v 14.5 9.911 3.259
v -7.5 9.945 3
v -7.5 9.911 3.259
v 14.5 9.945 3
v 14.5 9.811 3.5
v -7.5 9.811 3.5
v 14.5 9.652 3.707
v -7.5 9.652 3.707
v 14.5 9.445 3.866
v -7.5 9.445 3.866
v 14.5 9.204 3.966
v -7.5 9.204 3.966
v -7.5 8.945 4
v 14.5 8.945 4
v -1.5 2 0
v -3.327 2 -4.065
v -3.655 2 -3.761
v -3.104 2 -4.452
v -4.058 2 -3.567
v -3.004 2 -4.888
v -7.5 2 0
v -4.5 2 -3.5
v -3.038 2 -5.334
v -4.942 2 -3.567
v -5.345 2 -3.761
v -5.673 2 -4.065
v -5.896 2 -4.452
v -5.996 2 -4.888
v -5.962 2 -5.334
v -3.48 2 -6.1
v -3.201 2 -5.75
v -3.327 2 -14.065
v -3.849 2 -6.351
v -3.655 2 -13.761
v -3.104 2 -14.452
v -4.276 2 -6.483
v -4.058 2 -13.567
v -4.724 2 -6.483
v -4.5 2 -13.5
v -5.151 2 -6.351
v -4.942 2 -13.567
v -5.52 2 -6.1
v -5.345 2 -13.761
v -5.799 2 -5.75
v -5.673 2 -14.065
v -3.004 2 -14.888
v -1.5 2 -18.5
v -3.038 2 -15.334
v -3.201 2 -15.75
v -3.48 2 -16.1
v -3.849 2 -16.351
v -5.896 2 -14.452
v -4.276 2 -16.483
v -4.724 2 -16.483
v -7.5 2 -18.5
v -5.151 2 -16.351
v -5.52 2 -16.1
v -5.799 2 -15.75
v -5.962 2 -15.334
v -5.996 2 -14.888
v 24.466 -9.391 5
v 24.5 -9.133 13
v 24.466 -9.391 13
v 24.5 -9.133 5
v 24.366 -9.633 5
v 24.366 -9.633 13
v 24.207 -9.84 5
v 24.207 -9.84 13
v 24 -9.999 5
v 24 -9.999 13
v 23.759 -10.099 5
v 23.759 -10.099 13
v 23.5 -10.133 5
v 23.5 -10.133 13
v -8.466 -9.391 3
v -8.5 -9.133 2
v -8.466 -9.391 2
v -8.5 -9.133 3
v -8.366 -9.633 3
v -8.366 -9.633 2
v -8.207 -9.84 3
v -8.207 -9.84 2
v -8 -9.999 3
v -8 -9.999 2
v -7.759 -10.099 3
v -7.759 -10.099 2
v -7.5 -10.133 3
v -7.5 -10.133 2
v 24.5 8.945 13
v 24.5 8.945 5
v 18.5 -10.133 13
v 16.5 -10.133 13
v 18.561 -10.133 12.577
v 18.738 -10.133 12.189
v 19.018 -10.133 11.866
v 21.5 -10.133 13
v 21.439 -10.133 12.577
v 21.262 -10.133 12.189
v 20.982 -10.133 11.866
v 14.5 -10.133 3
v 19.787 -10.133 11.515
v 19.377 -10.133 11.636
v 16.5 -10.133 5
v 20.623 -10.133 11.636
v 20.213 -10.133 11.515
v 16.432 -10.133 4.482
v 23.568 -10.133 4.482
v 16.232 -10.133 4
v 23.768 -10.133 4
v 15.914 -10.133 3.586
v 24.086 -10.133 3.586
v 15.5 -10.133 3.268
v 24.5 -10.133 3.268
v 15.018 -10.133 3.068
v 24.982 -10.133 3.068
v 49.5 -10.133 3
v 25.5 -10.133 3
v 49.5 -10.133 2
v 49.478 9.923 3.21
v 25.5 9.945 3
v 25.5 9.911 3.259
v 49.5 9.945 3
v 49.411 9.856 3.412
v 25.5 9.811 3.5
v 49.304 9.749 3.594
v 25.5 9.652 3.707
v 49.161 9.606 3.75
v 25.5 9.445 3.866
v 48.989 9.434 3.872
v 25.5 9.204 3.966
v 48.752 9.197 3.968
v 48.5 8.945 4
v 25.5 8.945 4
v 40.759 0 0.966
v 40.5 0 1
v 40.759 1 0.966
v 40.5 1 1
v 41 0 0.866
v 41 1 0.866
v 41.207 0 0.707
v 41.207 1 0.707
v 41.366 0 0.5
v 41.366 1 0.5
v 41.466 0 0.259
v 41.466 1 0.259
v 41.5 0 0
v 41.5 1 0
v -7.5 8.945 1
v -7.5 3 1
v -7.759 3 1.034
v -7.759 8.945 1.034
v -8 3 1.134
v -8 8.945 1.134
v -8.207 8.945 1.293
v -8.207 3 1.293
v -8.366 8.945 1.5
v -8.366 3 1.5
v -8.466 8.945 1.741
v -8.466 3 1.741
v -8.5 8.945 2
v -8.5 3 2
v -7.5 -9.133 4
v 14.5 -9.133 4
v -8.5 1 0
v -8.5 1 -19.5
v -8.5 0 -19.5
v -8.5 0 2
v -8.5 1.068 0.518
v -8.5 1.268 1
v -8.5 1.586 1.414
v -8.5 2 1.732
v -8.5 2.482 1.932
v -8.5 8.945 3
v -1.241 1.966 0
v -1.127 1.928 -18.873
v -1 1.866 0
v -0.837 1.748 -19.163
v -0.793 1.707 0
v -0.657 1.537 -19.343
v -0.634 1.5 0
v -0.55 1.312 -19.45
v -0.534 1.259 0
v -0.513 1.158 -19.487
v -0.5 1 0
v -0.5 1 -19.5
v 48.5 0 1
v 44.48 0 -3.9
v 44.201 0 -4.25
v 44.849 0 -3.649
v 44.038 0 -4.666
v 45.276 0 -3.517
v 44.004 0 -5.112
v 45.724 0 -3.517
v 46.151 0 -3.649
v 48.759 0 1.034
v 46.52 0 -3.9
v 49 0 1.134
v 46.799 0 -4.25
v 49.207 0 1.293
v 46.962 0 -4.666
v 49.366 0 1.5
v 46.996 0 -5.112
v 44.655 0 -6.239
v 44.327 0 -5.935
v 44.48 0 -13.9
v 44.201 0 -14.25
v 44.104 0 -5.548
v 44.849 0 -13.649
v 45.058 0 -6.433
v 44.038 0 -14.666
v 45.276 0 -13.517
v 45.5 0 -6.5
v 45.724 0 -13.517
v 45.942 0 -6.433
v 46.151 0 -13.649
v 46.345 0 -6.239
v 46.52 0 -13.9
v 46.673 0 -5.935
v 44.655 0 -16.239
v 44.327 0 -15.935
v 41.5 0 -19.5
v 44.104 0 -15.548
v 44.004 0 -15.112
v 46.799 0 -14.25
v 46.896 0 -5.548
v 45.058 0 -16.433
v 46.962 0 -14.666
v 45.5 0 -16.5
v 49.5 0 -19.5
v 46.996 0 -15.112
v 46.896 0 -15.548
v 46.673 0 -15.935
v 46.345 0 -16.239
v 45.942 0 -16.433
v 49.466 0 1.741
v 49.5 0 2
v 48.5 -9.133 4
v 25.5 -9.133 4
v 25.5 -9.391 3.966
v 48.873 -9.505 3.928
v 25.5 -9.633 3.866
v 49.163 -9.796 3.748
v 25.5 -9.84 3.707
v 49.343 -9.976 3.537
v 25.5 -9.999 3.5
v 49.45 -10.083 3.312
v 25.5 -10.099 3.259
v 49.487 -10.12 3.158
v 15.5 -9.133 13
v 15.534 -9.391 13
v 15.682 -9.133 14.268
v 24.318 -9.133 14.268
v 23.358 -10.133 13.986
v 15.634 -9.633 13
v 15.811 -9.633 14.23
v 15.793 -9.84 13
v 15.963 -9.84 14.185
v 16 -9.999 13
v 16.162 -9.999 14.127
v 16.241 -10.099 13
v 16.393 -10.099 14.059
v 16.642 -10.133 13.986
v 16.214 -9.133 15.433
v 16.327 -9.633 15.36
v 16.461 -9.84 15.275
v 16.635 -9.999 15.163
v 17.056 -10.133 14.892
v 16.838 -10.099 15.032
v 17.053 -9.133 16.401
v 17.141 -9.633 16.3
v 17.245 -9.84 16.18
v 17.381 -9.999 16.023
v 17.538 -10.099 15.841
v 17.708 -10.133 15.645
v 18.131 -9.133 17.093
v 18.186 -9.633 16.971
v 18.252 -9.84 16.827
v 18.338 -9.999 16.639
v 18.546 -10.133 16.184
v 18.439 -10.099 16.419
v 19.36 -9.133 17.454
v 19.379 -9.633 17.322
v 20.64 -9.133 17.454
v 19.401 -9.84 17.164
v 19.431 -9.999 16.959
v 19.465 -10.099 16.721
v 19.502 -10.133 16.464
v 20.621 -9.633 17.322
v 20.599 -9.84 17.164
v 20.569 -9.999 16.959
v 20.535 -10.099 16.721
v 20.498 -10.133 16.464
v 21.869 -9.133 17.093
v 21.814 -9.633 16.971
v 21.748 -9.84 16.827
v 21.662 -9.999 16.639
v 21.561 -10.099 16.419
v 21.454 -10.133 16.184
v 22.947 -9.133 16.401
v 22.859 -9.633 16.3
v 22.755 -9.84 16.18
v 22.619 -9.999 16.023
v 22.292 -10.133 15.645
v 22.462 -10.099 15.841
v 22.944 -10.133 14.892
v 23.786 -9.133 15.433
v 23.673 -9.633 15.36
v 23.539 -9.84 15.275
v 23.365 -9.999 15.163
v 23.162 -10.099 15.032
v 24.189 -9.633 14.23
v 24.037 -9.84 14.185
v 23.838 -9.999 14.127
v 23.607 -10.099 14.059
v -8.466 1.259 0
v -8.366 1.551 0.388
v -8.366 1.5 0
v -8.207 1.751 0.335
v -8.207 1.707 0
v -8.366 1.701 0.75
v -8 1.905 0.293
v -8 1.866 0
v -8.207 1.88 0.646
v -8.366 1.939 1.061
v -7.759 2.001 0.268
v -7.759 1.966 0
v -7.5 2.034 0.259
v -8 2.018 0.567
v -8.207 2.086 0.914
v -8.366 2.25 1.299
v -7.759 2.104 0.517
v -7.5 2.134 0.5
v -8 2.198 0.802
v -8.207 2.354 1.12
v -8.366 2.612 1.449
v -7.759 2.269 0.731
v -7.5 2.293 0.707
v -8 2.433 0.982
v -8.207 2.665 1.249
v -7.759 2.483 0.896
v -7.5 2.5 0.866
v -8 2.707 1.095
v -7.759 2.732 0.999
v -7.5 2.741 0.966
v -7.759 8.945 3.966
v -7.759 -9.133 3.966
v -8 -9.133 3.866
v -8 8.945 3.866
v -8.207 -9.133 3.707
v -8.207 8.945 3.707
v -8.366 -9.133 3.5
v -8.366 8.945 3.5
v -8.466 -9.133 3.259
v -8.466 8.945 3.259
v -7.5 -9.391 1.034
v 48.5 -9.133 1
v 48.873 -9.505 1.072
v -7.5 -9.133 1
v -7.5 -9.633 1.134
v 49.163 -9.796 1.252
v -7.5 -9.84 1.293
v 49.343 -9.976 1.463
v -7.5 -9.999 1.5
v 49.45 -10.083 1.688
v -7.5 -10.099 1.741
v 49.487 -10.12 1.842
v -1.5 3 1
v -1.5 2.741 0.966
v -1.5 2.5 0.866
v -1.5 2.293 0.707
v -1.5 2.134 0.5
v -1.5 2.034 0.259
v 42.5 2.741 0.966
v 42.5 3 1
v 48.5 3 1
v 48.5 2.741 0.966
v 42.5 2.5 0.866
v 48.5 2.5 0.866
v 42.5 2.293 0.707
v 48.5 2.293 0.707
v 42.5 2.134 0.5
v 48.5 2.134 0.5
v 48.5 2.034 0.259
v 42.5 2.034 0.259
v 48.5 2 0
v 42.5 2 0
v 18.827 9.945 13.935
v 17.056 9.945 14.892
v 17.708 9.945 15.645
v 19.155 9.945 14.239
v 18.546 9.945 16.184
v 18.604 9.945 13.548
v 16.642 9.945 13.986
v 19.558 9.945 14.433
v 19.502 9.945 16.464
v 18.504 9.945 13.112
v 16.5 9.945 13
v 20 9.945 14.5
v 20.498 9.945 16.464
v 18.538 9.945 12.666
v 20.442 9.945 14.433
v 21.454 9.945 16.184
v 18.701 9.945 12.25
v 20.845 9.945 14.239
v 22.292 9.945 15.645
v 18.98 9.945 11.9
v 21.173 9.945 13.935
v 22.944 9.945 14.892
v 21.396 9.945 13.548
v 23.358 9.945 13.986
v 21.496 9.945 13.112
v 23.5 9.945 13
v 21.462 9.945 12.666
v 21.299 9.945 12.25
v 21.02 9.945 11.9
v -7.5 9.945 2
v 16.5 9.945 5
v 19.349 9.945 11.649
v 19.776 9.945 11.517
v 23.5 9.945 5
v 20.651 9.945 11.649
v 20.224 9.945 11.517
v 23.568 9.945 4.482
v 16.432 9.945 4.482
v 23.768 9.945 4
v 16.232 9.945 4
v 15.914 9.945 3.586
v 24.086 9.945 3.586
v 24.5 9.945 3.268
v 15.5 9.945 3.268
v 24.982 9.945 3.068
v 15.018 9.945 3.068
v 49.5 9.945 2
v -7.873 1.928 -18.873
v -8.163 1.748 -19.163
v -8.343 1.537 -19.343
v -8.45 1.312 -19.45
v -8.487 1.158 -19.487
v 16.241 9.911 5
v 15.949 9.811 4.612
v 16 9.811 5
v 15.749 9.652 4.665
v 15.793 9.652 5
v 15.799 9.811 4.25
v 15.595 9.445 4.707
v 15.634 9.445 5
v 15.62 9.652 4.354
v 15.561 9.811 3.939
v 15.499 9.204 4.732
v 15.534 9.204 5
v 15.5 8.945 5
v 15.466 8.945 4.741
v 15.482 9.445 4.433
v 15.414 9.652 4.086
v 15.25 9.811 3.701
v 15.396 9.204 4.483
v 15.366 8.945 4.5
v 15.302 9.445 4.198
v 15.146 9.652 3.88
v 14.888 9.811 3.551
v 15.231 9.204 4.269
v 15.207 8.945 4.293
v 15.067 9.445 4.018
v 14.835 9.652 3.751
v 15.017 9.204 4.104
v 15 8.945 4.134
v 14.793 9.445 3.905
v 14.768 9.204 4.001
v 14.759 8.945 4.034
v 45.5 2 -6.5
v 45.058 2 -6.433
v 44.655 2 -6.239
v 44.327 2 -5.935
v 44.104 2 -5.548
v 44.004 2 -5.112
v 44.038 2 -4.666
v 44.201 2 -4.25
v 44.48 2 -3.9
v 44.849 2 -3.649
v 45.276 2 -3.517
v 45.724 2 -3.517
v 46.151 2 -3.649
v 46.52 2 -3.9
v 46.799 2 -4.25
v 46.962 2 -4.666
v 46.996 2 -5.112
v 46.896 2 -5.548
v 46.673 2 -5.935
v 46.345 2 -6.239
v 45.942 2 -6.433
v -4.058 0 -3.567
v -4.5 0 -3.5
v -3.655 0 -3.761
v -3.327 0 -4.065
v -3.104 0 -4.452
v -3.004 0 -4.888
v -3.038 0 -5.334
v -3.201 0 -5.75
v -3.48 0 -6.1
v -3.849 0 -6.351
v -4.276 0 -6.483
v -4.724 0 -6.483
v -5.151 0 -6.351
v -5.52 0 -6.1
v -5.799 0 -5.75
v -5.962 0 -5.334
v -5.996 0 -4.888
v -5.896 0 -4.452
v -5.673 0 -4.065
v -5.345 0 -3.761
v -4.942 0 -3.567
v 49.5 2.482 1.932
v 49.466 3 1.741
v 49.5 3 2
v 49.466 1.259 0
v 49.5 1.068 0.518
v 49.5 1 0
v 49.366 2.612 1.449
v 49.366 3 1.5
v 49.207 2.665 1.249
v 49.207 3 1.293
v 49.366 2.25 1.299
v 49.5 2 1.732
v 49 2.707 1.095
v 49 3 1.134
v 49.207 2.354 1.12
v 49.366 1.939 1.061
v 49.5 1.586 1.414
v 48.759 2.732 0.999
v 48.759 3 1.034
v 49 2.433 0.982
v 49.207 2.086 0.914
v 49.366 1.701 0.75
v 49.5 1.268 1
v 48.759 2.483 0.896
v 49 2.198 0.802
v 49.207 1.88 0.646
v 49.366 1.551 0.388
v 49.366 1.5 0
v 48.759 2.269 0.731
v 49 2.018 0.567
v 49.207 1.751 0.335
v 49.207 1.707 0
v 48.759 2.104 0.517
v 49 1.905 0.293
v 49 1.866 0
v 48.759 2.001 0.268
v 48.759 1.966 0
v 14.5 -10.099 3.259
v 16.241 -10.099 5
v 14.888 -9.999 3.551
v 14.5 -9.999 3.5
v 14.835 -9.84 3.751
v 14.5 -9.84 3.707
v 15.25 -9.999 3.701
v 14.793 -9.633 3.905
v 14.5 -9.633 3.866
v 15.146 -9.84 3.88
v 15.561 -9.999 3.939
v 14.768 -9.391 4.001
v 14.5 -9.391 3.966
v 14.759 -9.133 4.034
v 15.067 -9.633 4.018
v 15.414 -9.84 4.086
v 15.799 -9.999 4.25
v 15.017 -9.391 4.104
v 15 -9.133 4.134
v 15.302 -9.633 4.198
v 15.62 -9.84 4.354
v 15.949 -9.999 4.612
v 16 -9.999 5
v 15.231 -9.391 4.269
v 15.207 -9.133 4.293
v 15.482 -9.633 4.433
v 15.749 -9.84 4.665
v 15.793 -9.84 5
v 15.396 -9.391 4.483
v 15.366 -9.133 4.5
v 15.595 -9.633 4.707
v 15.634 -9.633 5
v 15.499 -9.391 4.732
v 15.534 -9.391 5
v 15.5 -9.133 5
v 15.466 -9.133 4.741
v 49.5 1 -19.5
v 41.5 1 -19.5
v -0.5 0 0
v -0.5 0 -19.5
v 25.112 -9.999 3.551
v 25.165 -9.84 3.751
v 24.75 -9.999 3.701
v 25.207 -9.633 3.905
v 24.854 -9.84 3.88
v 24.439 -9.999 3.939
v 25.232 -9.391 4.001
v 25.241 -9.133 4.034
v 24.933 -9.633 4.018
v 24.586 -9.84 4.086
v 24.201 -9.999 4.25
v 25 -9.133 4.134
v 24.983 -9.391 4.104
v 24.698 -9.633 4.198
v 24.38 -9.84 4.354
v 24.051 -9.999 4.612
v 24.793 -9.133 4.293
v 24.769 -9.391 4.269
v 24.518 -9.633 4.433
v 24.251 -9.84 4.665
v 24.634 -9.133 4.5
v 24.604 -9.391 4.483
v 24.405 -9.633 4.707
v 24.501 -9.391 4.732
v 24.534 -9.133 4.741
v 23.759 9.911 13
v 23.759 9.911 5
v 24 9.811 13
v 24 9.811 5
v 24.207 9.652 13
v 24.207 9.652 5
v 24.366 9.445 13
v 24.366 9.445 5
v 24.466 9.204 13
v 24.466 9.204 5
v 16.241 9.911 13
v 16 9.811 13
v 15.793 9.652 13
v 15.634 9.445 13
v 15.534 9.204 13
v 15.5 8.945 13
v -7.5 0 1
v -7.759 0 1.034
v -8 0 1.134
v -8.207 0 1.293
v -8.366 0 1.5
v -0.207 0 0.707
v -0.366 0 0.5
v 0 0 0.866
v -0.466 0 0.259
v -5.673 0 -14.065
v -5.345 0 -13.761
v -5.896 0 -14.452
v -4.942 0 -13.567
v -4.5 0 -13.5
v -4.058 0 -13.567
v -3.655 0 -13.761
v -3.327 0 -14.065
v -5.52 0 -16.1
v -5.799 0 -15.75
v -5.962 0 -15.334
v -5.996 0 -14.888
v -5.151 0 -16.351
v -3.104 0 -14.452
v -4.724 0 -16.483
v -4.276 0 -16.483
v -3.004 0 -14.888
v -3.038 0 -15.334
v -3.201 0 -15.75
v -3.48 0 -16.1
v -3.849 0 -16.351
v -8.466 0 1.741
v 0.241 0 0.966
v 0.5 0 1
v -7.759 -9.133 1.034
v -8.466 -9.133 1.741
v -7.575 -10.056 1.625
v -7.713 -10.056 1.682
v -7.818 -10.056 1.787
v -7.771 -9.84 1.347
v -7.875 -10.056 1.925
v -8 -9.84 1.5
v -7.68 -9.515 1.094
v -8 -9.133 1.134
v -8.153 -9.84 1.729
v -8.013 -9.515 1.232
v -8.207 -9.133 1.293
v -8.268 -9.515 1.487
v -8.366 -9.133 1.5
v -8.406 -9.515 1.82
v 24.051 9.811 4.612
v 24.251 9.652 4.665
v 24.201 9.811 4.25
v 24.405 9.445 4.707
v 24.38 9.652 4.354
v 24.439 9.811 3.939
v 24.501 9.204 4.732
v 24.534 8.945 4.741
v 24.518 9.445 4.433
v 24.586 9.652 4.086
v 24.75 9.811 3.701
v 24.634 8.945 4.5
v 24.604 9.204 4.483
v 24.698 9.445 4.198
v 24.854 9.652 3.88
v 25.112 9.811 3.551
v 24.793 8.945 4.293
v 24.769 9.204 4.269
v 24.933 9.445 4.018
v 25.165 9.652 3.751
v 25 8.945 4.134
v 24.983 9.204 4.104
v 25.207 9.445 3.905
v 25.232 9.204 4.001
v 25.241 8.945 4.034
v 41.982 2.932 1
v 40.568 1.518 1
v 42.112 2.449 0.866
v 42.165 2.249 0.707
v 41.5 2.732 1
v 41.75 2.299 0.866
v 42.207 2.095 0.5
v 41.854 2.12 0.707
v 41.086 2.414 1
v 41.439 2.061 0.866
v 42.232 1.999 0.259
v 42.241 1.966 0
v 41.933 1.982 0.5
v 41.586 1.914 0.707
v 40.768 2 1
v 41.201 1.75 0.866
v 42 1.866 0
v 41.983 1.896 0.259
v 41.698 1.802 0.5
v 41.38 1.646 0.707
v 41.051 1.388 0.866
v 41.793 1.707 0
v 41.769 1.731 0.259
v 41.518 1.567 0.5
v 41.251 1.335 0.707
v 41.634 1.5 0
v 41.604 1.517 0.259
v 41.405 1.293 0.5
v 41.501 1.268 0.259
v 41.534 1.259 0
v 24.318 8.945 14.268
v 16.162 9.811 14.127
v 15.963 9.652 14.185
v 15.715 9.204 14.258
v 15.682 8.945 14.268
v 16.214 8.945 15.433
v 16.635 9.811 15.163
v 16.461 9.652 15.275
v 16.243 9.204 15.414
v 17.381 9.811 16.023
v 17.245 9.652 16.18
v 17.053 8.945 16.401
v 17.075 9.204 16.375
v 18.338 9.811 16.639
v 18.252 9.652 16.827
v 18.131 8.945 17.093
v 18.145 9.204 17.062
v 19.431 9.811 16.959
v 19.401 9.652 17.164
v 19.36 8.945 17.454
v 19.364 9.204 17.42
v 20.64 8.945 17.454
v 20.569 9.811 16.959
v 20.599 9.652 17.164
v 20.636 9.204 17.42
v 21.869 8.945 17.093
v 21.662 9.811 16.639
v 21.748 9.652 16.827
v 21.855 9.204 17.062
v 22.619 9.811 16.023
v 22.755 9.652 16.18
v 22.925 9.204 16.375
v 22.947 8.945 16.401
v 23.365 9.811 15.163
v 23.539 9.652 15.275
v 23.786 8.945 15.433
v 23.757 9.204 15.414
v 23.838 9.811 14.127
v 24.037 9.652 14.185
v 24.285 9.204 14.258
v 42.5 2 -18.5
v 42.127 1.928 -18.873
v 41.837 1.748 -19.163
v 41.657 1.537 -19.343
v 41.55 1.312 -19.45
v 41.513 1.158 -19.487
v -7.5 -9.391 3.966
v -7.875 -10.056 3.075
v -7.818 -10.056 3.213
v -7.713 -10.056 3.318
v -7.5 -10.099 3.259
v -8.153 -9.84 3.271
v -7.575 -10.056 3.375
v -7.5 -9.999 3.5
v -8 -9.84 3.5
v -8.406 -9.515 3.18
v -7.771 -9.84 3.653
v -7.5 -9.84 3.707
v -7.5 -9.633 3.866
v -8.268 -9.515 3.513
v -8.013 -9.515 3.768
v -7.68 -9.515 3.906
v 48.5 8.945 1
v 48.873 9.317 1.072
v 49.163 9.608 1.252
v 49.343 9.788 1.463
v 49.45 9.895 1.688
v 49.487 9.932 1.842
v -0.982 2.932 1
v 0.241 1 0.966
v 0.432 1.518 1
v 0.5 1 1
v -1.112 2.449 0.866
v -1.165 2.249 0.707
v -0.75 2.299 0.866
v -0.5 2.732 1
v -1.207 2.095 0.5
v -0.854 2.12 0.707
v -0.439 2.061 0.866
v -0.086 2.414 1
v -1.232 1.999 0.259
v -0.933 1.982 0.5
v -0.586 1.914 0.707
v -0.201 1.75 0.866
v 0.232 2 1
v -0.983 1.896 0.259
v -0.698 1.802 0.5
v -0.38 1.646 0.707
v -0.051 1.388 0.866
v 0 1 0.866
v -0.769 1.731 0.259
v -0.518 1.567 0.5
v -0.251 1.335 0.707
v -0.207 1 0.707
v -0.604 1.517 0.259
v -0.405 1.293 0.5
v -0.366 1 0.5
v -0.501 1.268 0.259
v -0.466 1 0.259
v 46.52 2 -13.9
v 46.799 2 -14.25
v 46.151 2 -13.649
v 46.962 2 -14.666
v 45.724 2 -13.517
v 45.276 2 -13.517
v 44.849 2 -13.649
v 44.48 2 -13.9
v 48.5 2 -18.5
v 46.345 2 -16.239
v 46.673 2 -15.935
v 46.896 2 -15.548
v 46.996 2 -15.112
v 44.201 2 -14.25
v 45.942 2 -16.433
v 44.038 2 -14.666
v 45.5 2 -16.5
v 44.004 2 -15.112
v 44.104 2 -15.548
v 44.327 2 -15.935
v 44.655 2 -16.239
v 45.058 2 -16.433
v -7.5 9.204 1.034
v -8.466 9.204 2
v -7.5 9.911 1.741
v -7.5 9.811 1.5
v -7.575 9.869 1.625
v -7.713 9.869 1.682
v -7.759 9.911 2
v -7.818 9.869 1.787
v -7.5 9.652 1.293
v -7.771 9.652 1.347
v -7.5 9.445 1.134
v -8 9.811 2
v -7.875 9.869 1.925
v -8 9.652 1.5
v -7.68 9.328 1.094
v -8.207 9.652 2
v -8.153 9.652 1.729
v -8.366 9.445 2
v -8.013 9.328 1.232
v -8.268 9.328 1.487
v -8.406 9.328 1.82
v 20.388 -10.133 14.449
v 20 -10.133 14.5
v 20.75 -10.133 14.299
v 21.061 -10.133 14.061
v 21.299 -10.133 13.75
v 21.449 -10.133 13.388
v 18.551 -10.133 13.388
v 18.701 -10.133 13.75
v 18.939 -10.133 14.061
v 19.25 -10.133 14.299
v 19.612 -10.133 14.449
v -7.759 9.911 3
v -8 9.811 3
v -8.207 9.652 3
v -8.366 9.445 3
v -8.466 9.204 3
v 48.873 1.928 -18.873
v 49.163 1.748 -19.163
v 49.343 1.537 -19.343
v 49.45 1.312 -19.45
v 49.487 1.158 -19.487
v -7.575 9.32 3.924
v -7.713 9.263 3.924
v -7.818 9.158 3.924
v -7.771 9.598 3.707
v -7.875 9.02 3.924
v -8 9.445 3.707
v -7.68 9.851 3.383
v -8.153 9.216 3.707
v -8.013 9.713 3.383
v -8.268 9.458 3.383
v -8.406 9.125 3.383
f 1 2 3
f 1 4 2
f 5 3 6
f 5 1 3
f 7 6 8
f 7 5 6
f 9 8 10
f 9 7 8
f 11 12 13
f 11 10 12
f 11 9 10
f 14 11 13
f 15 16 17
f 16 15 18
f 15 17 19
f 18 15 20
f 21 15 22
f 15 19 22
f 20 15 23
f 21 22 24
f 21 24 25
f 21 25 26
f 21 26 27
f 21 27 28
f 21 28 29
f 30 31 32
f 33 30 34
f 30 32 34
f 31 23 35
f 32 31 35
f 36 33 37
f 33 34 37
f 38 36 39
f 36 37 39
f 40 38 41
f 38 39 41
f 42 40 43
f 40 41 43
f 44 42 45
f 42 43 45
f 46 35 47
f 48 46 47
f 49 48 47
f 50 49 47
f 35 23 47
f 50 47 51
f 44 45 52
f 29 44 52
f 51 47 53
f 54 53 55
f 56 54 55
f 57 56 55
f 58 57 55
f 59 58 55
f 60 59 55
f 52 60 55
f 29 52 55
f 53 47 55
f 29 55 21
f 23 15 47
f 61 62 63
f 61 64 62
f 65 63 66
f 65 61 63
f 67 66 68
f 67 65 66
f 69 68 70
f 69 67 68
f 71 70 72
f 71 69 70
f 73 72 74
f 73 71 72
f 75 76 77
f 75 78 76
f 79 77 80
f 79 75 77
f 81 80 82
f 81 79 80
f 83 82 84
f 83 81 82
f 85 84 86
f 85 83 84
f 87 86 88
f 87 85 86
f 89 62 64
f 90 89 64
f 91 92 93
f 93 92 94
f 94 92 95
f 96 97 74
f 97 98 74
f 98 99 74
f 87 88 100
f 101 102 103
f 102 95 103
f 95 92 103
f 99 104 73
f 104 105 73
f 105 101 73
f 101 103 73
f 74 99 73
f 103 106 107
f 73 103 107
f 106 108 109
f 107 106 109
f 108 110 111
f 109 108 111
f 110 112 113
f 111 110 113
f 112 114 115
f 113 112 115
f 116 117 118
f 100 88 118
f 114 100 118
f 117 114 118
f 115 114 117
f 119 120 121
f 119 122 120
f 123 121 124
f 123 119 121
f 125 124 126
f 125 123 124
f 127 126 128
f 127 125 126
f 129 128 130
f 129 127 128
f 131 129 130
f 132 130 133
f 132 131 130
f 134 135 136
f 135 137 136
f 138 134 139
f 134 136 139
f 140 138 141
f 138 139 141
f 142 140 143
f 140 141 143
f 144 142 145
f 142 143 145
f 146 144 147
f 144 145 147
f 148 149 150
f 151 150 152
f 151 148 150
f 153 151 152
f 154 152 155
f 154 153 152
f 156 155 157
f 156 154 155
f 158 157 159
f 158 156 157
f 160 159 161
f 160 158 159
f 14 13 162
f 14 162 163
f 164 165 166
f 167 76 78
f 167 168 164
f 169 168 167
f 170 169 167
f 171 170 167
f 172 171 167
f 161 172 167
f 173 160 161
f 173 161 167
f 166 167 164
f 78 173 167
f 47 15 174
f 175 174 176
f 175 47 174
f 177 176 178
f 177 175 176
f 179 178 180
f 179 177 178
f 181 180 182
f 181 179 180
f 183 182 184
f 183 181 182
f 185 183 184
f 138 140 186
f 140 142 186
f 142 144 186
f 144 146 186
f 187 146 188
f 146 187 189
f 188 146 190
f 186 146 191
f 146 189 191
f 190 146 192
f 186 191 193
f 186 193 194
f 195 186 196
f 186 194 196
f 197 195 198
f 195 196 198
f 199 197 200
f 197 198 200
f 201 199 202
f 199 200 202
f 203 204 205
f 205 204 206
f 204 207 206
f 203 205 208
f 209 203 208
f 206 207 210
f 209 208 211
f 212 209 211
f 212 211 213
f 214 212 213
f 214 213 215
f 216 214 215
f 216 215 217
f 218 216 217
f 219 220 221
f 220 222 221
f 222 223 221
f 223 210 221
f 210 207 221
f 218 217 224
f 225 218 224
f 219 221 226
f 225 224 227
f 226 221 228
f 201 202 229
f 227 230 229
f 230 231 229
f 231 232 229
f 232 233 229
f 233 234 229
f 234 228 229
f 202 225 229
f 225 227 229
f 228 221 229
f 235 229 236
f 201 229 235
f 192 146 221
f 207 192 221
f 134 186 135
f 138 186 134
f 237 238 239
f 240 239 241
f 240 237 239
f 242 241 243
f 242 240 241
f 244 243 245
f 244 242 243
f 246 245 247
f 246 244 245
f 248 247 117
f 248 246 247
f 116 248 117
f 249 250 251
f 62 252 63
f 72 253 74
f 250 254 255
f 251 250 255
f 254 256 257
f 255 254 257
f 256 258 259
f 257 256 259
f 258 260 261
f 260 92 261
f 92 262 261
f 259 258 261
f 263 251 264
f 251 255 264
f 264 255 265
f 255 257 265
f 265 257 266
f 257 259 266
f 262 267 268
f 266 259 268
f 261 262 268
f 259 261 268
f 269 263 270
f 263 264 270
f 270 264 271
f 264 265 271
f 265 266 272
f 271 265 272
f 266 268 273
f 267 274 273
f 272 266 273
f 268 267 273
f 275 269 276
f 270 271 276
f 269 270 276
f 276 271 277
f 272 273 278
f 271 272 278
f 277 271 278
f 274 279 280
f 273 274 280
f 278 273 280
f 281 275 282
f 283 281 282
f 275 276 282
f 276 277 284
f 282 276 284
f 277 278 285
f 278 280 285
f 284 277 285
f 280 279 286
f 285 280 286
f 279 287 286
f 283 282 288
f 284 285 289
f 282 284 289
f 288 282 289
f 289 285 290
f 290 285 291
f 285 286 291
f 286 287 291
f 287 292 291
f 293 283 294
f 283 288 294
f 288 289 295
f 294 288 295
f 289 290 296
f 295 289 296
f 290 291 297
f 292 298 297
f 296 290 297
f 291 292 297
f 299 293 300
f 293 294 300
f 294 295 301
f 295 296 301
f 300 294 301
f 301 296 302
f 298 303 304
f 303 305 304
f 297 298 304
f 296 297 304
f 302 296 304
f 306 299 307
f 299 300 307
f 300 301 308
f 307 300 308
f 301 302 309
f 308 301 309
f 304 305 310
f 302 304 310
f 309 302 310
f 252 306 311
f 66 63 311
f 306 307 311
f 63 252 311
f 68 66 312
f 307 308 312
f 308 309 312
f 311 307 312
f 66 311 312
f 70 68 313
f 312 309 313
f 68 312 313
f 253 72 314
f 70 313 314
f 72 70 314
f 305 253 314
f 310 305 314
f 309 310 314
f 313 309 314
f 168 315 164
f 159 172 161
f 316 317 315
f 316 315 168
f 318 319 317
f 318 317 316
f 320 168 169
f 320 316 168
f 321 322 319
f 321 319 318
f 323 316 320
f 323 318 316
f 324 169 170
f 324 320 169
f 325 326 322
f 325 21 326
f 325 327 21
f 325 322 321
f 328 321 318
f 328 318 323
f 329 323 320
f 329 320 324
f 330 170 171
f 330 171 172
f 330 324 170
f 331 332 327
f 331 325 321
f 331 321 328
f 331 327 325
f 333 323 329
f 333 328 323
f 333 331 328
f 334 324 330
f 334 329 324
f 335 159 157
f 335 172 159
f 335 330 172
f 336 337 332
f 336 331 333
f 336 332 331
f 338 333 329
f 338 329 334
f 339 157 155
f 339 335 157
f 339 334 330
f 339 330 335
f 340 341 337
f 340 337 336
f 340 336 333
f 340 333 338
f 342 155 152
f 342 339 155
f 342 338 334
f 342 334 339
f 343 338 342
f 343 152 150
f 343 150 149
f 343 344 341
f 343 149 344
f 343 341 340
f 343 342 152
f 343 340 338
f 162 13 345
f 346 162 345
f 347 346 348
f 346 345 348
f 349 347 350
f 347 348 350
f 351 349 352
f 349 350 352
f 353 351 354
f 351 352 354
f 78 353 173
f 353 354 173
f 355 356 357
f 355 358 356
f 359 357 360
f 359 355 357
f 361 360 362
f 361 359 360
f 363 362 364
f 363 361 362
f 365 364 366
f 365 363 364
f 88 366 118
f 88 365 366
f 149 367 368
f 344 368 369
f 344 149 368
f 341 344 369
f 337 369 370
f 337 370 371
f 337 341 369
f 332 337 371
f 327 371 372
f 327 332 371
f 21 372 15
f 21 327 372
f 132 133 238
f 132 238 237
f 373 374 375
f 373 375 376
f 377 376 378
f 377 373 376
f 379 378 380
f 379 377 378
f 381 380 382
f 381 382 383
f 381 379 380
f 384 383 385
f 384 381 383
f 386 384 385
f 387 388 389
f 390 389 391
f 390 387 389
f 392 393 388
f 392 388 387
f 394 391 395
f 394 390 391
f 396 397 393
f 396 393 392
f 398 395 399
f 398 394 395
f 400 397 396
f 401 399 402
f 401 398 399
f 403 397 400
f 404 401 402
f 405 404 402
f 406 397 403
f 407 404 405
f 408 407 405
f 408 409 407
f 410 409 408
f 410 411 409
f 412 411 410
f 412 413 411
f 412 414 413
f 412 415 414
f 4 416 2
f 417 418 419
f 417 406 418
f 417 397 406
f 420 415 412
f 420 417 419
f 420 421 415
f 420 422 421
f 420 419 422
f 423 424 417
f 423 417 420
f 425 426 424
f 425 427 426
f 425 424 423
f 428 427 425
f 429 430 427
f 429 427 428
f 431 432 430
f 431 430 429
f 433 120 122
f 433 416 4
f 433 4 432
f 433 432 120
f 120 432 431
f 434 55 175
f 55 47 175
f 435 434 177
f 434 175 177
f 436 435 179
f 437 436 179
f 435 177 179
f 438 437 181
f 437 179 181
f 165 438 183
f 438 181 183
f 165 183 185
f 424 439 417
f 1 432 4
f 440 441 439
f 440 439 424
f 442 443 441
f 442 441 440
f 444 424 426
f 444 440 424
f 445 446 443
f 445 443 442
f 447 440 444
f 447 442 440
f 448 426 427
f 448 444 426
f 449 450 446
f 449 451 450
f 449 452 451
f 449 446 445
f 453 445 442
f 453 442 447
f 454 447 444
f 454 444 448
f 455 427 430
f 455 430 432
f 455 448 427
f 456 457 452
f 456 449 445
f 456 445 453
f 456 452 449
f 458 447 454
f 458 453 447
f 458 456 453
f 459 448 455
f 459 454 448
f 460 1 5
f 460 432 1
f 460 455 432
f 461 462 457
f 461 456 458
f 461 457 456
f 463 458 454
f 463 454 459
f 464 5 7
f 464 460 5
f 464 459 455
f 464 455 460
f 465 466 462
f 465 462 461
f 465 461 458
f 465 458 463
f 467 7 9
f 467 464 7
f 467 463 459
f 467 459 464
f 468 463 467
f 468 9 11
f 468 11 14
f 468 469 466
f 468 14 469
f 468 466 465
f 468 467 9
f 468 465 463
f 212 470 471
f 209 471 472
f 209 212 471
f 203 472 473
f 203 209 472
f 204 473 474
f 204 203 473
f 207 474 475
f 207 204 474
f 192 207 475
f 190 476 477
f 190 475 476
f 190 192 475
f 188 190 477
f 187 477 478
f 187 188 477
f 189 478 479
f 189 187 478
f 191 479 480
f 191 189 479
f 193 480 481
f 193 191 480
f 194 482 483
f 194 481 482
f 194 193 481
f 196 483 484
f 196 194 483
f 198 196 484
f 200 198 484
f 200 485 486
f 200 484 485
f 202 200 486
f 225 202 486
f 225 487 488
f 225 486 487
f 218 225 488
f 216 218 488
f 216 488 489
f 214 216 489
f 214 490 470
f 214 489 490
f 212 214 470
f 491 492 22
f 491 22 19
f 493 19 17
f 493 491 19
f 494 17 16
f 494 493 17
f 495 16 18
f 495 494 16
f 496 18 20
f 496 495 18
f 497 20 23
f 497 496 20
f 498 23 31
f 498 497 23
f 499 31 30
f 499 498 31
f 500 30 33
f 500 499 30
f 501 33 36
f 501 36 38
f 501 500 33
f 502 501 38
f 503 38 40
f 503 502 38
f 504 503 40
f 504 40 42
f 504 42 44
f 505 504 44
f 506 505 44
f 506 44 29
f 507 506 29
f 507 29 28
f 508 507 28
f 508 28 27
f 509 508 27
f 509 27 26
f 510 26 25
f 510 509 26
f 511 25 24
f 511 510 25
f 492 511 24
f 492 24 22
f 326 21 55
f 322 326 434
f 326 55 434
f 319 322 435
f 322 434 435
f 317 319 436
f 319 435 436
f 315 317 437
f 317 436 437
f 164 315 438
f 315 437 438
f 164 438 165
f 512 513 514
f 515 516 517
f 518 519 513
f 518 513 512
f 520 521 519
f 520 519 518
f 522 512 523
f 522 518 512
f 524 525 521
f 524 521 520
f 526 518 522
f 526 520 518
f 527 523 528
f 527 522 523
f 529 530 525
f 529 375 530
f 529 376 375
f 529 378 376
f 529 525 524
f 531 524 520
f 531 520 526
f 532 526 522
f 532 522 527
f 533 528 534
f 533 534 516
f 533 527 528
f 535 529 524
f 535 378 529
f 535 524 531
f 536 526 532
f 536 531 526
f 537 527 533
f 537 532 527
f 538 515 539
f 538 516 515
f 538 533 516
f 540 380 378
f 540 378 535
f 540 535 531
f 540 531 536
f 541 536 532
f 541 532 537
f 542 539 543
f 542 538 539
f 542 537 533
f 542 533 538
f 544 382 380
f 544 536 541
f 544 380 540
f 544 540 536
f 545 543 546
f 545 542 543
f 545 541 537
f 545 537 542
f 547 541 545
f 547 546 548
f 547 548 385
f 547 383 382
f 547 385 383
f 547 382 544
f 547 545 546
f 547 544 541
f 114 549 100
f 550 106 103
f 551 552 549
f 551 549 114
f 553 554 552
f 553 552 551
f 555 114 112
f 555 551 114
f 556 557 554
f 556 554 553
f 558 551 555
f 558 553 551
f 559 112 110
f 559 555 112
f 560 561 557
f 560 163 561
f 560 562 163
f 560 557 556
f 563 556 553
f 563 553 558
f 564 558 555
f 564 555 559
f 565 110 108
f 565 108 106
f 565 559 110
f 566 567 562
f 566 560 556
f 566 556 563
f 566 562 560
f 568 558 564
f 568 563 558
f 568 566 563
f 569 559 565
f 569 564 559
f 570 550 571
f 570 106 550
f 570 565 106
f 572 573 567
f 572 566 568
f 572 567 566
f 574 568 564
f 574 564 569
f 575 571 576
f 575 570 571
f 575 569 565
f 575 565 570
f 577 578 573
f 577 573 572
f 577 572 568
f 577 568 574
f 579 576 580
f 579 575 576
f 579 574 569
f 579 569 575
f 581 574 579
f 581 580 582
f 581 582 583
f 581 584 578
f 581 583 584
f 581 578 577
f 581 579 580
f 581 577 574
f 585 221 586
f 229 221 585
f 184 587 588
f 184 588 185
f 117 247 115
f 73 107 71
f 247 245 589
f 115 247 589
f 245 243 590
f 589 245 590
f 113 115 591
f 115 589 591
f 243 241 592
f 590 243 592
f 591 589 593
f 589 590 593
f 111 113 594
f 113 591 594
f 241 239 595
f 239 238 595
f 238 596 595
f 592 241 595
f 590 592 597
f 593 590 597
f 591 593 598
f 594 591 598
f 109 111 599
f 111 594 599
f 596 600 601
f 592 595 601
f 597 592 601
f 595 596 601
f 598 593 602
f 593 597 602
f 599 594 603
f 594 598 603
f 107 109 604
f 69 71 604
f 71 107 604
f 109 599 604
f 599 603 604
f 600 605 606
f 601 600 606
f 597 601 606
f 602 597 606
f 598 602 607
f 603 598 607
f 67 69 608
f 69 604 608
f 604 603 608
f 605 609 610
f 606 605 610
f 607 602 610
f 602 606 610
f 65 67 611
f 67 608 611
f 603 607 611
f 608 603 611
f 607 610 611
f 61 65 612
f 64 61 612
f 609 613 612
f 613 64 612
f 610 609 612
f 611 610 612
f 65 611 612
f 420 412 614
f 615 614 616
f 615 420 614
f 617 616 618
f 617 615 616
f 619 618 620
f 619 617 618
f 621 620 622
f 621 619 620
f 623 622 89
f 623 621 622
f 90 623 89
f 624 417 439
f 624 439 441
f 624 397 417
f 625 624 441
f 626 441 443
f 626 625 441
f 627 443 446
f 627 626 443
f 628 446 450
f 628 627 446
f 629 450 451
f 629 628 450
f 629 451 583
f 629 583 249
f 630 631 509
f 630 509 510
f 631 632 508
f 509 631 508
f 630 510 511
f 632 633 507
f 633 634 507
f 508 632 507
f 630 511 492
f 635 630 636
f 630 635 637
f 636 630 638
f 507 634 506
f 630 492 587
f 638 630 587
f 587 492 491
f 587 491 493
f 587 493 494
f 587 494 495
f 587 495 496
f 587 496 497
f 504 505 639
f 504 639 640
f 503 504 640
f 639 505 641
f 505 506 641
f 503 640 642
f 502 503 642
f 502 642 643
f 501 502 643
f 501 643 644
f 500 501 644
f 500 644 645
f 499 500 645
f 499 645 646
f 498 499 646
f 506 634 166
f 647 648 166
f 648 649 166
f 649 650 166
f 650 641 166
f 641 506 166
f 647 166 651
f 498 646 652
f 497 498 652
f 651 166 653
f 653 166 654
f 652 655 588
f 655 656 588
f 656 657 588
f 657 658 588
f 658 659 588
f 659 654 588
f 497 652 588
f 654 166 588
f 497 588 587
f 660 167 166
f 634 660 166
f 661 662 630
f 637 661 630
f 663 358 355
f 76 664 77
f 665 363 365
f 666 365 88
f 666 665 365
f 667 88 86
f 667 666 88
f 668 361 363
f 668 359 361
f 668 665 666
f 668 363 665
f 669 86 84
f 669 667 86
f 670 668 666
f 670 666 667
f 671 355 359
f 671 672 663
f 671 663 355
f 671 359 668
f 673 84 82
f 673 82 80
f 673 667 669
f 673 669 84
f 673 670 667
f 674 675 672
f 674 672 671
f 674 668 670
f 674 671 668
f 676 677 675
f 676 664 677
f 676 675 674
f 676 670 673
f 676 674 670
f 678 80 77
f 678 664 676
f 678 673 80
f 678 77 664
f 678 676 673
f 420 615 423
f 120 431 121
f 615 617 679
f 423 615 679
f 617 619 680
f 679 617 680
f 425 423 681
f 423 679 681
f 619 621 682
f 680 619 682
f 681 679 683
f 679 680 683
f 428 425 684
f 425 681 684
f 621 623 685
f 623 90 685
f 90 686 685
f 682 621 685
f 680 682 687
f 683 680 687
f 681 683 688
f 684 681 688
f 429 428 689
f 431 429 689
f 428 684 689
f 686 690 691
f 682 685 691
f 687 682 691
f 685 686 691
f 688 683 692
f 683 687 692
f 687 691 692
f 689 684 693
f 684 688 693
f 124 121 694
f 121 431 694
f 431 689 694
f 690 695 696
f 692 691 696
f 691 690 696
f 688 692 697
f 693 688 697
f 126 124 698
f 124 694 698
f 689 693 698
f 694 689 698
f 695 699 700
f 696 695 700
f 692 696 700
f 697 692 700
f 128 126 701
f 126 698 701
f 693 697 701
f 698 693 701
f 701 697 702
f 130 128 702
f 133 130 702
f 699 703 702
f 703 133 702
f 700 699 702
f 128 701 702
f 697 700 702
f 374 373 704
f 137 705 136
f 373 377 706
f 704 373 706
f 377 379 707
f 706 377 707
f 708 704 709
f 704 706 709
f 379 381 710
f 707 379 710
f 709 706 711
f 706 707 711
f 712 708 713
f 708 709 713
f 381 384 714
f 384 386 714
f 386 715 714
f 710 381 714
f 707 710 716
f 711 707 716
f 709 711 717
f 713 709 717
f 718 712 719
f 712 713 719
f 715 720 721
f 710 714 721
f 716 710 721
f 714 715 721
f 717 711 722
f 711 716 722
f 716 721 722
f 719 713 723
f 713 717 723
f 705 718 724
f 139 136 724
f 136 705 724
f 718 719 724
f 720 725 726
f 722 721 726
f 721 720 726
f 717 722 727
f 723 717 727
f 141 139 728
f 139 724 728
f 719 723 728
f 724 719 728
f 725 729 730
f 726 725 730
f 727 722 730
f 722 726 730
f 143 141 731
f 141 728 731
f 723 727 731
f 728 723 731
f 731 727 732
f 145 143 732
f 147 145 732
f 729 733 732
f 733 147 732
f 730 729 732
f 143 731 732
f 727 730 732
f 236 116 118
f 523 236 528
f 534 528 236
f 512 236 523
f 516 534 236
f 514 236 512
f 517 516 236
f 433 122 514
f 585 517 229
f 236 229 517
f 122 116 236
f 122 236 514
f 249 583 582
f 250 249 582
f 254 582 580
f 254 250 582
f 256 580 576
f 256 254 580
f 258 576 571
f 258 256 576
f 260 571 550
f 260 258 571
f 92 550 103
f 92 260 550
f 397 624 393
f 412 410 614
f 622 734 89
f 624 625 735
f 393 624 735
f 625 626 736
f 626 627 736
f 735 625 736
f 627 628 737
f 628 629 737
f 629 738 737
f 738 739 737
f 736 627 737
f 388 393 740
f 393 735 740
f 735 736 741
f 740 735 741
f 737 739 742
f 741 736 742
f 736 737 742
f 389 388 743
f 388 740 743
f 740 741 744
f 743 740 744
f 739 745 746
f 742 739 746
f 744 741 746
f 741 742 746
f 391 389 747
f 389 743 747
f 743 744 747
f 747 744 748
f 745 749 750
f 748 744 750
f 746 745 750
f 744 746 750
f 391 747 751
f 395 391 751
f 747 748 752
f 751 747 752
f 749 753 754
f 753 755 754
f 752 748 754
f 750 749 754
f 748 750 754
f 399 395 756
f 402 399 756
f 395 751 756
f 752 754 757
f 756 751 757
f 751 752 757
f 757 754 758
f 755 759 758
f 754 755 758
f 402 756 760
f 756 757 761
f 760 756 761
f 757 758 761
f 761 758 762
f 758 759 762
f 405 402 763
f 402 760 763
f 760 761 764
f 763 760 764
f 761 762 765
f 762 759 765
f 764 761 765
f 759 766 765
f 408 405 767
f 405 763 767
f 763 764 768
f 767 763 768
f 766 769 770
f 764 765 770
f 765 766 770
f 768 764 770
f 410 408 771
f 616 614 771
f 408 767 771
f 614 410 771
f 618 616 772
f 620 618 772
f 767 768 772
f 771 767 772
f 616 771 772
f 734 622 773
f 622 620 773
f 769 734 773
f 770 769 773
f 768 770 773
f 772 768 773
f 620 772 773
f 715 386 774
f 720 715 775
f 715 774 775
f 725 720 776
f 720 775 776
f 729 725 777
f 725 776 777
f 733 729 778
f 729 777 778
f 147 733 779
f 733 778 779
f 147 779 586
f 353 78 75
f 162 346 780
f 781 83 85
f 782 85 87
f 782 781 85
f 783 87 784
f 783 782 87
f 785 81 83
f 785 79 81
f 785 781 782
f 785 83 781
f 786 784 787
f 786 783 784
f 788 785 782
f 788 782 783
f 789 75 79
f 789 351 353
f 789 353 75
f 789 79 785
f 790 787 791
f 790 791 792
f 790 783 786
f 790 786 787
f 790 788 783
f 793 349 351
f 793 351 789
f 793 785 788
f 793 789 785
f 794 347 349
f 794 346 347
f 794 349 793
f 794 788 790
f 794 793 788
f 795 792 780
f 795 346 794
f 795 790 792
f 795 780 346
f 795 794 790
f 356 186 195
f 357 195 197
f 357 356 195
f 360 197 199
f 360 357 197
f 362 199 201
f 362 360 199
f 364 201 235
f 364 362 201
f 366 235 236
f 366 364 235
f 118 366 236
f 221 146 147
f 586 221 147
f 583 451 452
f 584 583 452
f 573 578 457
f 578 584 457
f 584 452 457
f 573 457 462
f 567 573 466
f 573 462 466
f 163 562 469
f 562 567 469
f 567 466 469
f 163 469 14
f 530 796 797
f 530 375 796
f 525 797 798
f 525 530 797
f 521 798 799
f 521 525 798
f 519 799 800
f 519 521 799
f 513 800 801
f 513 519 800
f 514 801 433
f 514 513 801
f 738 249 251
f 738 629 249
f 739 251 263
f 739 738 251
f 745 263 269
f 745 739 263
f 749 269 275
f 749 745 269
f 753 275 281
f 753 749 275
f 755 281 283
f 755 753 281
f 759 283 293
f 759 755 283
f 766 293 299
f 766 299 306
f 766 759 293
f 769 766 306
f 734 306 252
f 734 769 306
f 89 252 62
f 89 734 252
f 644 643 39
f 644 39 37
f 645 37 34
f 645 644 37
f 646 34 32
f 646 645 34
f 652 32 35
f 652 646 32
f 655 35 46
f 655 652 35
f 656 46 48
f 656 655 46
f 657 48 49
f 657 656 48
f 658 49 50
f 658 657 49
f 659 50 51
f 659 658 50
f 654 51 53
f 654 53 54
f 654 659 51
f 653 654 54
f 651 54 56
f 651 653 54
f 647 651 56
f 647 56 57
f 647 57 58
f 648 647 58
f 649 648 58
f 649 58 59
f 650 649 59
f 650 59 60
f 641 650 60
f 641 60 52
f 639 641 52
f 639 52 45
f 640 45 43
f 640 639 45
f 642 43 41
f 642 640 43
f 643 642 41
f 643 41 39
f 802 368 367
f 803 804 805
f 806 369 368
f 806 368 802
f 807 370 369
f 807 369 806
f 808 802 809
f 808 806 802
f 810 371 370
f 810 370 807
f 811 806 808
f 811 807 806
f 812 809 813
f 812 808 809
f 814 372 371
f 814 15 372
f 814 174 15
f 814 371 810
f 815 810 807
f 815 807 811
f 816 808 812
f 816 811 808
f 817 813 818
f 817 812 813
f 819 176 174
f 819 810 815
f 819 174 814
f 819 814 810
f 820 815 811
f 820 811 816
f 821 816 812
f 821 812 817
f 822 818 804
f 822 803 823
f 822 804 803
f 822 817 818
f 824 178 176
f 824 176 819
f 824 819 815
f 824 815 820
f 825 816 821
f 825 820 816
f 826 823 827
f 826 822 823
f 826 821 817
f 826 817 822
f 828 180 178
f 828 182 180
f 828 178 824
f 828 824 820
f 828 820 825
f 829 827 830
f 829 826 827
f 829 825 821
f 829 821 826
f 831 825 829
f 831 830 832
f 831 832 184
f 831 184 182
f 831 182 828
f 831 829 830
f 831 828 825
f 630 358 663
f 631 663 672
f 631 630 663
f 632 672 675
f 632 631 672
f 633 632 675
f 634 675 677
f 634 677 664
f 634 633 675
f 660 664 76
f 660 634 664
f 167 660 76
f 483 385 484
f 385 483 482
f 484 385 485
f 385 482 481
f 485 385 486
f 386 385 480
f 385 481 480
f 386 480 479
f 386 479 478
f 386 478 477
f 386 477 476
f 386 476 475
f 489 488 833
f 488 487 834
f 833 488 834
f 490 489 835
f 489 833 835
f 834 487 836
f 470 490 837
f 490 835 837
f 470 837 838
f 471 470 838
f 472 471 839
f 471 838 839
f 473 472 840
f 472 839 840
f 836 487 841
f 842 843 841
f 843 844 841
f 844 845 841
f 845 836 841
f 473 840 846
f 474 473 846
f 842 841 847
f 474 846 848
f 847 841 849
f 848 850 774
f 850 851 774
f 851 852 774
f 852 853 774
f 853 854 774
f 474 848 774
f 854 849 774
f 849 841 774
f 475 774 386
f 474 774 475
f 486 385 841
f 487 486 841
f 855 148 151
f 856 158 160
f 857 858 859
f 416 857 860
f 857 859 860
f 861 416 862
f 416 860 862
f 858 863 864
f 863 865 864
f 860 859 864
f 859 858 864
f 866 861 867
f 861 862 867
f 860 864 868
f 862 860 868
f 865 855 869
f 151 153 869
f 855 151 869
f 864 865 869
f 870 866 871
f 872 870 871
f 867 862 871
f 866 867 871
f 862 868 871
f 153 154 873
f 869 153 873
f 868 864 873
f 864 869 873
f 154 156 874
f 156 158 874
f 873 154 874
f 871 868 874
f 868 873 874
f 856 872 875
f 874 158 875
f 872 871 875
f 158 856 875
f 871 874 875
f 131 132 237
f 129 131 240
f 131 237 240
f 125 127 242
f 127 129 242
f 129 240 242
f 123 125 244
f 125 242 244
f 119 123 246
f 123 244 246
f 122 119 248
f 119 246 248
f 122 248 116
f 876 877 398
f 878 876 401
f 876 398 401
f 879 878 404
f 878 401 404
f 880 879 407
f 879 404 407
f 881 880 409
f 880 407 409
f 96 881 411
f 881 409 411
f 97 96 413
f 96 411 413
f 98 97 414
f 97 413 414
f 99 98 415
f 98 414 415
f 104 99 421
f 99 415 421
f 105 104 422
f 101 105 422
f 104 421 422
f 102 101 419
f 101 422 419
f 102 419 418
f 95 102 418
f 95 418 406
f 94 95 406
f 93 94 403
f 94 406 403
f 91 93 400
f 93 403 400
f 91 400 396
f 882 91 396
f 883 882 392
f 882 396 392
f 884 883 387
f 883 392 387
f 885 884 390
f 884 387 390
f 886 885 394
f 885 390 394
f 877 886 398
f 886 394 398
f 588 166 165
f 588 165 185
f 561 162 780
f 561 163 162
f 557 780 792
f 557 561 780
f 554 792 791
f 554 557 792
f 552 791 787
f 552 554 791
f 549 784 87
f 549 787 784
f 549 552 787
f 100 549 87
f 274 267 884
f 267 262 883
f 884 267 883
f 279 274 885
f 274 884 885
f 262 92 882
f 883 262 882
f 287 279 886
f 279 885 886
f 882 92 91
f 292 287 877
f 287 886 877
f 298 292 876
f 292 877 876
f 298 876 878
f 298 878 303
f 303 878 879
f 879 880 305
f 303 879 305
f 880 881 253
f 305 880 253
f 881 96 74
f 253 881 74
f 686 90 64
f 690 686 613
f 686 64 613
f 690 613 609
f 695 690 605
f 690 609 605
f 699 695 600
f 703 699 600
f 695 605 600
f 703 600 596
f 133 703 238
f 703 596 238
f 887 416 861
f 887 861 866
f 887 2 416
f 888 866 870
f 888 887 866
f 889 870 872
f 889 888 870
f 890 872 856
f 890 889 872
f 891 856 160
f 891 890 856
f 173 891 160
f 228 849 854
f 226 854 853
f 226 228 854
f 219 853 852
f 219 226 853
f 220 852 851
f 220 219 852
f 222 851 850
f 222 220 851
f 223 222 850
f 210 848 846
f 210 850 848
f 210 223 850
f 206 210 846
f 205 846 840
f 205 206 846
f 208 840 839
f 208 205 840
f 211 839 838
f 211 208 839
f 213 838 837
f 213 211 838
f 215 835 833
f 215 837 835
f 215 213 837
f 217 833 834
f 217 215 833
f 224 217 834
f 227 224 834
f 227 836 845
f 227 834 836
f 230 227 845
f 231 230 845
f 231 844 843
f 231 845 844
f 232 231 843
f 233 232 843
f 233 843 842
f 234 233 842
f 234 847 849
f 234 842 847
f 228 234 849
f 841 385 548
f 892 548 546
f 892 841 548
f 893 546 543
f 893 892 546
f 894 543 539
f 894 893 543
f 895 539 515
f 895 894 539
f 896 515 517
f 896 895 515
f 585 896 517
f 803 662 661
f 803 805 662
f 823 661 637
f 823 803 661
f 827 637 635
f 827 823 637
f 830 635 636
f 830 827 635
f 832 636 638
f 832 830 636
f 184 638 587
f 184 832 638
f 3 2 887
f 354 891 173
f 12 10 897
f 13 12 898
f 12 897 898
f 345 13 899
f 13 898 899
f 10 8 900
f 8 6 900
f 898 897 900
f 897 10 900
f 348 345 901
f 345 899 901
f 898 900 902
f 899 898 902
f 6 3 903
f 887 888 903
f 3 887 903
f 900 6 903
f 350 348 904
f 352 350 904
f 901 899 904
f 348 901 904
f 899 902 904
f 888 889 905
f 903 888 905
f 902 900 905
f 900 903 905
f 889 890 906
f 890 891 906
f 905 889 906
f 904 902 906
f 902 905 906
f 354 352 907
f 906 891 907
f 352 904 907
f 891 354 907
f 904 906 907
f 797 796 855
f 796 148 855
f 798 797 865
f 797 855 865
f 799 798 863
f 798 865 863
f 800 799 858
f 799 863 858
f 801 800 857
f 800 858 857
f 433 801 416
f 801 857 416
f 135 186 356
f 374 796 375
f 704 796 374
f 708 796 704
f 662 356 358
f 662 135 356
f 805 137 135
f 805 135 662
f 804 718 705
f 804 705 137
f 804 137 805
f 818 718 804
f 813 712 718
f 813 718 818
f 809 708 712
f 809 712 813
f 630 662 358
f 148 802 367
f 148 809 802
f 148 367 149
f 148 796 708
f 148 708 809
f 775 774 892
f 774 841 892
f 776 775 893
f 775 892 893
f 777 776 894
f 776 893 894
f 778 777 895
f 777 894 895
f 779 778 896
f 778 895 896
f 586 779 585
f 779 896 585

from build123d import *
from build123d.topology import SkipClean

# Parameters (mm, degrees)
SKETCH1_W             = 8
SKETCH1_H             = 19
SKETCH1_R             = 1.5
BOSS_EXTRUDE1_DEPTH   = 2
BOSS_EXTRUDE1_2_DEPTH = 2
SKETCH3_W             = 8
SKETCH3_H             = 2
BOSS_EXTRUDE3_DEPTH   = 4.5
SKETCH4_W             = 9
SKETCH4_H             = 18.077551635
BOSS_EXTRUDE4_DEPTH   = 9
BOSS_EXTRUDE5_DEPTH   = 18.077552
SKETCH6_R             = 1.5
CUT_EXTRUDE1_DEPTH    = 57.189837927
SKETCH1_3_R           = 1.5
CUT_EXTRUDE2_DEPTH    = 55.158745093
SKETCH1_4_R           = 1.5
CUT_EXTRUDE3_DEPTH    = 55.158745093
SKETCH12_W            = 42
SKETCH12_H            = 2
CUT_EXTRUDE5_DEPTH    = 1.5
BOSS_EXTRUDE6_START   = 2
SKETCH14_R            = 1.5
BOSS_EXTRUDE6_DEPTH   = 2
FILLET1_R             = 1


with BuildPart() as part:
    # Sketch1 → Boss-Extrude1 (new body)
    with BuildSketch(Plane(origin=(0, 0, 0), x_dir=(1, 0, 0), z_dir=(0, 1, 0))):
        with Locations((-4.5, 10)):
            Rectangle(SKETCH1_W, SKETCH1_H)
        with Locations(Location((-4.5, 15, 0), (0, 0, 270))):
            Circle(SKETCH1_R, mode=Mode.SUBTRACT)
        with Locations(Location((-4.5, 5, 0), (0, 0, 270))):
            Circle(SKETCH1_R, mode=Mode.SUBTRACT)
    extrude(amount=BOSS_EXTRUDE1_DEPTH)



with BuildPart() as body_2:
    # Sketch1 → Boss-Extrude1 2 (new body)
    with BuildSketch(Plane(origin=(0, 0, 0), x_dir=(1, 0, 0), z_dir=(0, 1, 0))):
        with Locations((45.5, 10)):
            Rectangle(SKETCH1_W, SKETCH1_H)
    extrude(amount=BOSS_EXTRUDE1_2_DEPTH)


with BuildPart() as part_1:
    add(part.part)

    add(body_2.part)  # Boss-Extrude3 merges body 2
    # Sketch3 → Boss-Extrude3 (add)
    with BuildSketch(Plane.XY.offset(-0.5)):
        Polygon((-0.5, 2), (-0.5, 0), (49.5, 0), (49.5, 7.944947695), (-8.5, 7.944947695), (-8.5, 2), align=None)
        Polygon((-0.5, 0), (-8.5, 0), (-8.5, -10.13260394), (49.5, -10.13260394), (49.5, 0), align=None)
        with Locations((-4.5, 1)):
            Rectangle(SKETCH3_W, SKETCH3_H)
    extrude(amount=BOSS_EXTRUDE3_DEPTH)

    # Sketch4 → Boss-Extrude4 (add)
    with BuildSketch(Plane.XY.offset(4)):
        with Locations((20, -1.093828123)):
            Rectangle(SKETCH4_W, SKETCH4_H)
    extrude(amount=BOSS_EXTRUDE4_DEPTH)

    # Sketch5 → Boss-Extrude5 (add, through all)
    with BuildSketch(Plane(origin=(0, 7.944947695, 0), x_dir=(1, 0, 0), z_dir=(0, 1, 0))):
        with BuildLine():
            Line((18.5, -13), (15.5, -13))
            ThreePointArc((15.5, -13), (20, -17.5), (24.5, -13))
            Line((24.5, -13), (21.5, -13))
            ThreePointArc((21.5, -13), (20, -14.5), (18.5, -13))
        make_face()
    extrude(amount=-BOSS_EXTRUDE5_DEPTH)

    # Sketch6 → Cut-Extrude1 (cut, through all)
    with SkipClean():  # the faces are left unmerged after this step: merging them gives an invalid solid
        with BuildSketch(Plane(origin=(0, 7.944947695, 0), x_dir=(1, 0, 0), z_dir=(0, 1, 0))):
            with Locations(Location((20, -13, 0), (0, 0, 270))):
                Circle(SKETCH6_R)
        extrude(amount=-CUT_EXTRUDE1_DEPTH, mode=Mode.SUBTRACT)

    # Sketch1<3> → Cut-Extrude2 (cut, through all)
    with SkipClean():  # the faces are left unmerged after this step: merging them gives an invalid solid
        with BuildSketch(Plane(origin=(0, 0, 0), x_dir=(1, 0, 0), z_dir=(0, 1, 0))):
            with Locations(Location((45.5, 15, 0), (0, 0, 90))):
                Circle(SKETCH1_3_R)
        extrude(amount=CUT_EXTRUDE2_DEPTH, mode=Mode.SUBTRACT)

    # Sketch1<4> → Cut-Extrude3 (cut, through all)
    with SkipClean():  # the faces are left unmerged after this step: merging them gives an invalid solid
        with BuildSketch(Plane(origin=(0, 0, 0), x_dir=(1, 0, 0), z_dir=(0, 1, 0))):
            with Locations(Location((45.5, 5, 0), (0, 0, 90))):
                Circle(SKETCH1_4_R)
        extrude(amount=CUT_EXTRUDE3_DEPTH, mode=Mode.SUBTRACT)

    # Sketch12 → Cut-Extrude5 (cut)
    with SkipClean():  # the faces are left unmerged after this step: merging them gives an invalid solid
        with BuildSketch(Plane(origin=(0, 0, -0.5), x_dir=(-1, 0, 0), z_dir=(0, 0, -1))):
            Polygon((-41.5, 2), (0.5, 2), (8.5, 2), (8.5, 7.944947695), (-49.5, 7.944947695), (-49.5, 2), align=None)
            with Locations((-20.5, 1)):
                Rectangle(SKETCH12_W, SKETCH12_H)
            Polygon((-41.5, 0), (-49.5, 0), (-49.5, -10.13260394), (8.5, -10.13260394), (8.5, 0), (0.5, 0), align=None)
        extrude(amount=-CUT_EXTRUDE5_DEPTH, mode=Mode.SUBTRACT)

    # Sketch14 → Boss-Extrude6 (add)
    with BuildSketch(Plane(origin=(0, 7.944947695, 0), x_dir=(1, 0, 0), z_dir=(0, 1, 0)).offset(BOSS_EXTRUDE6_START)):
        with BuildLine():
            Line((49.5, -1), (-8.5, -1))
            Line((-8.5, -1), (-8.5, -4))
            Line((-8.5, -4), (15.5, -4))
            Line((15.5, -4), (15.5, -13))
            ThreePointArc((15.5, -13), (20, -17.5), (24.5, -13))
            Line((24.5, -13), (24.5, -4))
            Line((24.5, -4), (49.5, -4))
            Line((49.5, -4), (49.5, -1))
        make_face()
        with Locations(Location((20, -13, 0), (0, 0, 270))):
            Circle(SKETCH14_R, mode=Mode.SUBTRACT)
    extrude(amount=-BOSS_EXTRUDE6_DEPTH)

    # Fillet1
    fillet1_edges = [part_1.edges().sort_by_distance(p)[0] for p in [
        (-0.5, 2, -9.25),
        (45.5, 2, 1),
        (49.5, 5.972473847, 1),
        (-8.5, 5.972473847, 1),
        (-4.5, 2, 1),
        (-0.5, 1, 1),
        (-8.5, -5.06630197, 1),
        (20.5, -10.13260394, 1),
        (49.5, -5.06630197, 1),
        (41.5, 1, 1),
        (20, 9.944947695, 17.5),
        (24.5, 9.944947695, 8.5),
        (37, 9.944947695, 4),
        (20.5, 9.944947695, 1),
        (-8.5, 9.944947695, 2.5),
        (-4.5, 2, -19.5),
        (3.5, 9.944947695, 4),
        (15.5, 9.944947695, 8.5),
        (-8.5, 2, -9.25),
        (-8.5, -0.093828123, 4),
        (-8.5, -10.13260394, 2.5),
        (3.5, -10.13260394, 4),
        (49.5, -0.093828123, 4),
        (49.5, 2, -9.25),
        (45.5, 2, -19.5),
        (41.5, 2, -9.25),
        (37, -10.13260394, 4),
        (15.5, -10.13260394, 8.5),
        (24.5, -0.093828123, 4),
        (24.5, -10.13260394, 8.5),
        (15.5, -0.093828123, 4),
        (20, -10.132604305, 17.5),
    ]]
    fillet(fillet1_edges, radius=FILLET1_R)


solid = part_1.part
